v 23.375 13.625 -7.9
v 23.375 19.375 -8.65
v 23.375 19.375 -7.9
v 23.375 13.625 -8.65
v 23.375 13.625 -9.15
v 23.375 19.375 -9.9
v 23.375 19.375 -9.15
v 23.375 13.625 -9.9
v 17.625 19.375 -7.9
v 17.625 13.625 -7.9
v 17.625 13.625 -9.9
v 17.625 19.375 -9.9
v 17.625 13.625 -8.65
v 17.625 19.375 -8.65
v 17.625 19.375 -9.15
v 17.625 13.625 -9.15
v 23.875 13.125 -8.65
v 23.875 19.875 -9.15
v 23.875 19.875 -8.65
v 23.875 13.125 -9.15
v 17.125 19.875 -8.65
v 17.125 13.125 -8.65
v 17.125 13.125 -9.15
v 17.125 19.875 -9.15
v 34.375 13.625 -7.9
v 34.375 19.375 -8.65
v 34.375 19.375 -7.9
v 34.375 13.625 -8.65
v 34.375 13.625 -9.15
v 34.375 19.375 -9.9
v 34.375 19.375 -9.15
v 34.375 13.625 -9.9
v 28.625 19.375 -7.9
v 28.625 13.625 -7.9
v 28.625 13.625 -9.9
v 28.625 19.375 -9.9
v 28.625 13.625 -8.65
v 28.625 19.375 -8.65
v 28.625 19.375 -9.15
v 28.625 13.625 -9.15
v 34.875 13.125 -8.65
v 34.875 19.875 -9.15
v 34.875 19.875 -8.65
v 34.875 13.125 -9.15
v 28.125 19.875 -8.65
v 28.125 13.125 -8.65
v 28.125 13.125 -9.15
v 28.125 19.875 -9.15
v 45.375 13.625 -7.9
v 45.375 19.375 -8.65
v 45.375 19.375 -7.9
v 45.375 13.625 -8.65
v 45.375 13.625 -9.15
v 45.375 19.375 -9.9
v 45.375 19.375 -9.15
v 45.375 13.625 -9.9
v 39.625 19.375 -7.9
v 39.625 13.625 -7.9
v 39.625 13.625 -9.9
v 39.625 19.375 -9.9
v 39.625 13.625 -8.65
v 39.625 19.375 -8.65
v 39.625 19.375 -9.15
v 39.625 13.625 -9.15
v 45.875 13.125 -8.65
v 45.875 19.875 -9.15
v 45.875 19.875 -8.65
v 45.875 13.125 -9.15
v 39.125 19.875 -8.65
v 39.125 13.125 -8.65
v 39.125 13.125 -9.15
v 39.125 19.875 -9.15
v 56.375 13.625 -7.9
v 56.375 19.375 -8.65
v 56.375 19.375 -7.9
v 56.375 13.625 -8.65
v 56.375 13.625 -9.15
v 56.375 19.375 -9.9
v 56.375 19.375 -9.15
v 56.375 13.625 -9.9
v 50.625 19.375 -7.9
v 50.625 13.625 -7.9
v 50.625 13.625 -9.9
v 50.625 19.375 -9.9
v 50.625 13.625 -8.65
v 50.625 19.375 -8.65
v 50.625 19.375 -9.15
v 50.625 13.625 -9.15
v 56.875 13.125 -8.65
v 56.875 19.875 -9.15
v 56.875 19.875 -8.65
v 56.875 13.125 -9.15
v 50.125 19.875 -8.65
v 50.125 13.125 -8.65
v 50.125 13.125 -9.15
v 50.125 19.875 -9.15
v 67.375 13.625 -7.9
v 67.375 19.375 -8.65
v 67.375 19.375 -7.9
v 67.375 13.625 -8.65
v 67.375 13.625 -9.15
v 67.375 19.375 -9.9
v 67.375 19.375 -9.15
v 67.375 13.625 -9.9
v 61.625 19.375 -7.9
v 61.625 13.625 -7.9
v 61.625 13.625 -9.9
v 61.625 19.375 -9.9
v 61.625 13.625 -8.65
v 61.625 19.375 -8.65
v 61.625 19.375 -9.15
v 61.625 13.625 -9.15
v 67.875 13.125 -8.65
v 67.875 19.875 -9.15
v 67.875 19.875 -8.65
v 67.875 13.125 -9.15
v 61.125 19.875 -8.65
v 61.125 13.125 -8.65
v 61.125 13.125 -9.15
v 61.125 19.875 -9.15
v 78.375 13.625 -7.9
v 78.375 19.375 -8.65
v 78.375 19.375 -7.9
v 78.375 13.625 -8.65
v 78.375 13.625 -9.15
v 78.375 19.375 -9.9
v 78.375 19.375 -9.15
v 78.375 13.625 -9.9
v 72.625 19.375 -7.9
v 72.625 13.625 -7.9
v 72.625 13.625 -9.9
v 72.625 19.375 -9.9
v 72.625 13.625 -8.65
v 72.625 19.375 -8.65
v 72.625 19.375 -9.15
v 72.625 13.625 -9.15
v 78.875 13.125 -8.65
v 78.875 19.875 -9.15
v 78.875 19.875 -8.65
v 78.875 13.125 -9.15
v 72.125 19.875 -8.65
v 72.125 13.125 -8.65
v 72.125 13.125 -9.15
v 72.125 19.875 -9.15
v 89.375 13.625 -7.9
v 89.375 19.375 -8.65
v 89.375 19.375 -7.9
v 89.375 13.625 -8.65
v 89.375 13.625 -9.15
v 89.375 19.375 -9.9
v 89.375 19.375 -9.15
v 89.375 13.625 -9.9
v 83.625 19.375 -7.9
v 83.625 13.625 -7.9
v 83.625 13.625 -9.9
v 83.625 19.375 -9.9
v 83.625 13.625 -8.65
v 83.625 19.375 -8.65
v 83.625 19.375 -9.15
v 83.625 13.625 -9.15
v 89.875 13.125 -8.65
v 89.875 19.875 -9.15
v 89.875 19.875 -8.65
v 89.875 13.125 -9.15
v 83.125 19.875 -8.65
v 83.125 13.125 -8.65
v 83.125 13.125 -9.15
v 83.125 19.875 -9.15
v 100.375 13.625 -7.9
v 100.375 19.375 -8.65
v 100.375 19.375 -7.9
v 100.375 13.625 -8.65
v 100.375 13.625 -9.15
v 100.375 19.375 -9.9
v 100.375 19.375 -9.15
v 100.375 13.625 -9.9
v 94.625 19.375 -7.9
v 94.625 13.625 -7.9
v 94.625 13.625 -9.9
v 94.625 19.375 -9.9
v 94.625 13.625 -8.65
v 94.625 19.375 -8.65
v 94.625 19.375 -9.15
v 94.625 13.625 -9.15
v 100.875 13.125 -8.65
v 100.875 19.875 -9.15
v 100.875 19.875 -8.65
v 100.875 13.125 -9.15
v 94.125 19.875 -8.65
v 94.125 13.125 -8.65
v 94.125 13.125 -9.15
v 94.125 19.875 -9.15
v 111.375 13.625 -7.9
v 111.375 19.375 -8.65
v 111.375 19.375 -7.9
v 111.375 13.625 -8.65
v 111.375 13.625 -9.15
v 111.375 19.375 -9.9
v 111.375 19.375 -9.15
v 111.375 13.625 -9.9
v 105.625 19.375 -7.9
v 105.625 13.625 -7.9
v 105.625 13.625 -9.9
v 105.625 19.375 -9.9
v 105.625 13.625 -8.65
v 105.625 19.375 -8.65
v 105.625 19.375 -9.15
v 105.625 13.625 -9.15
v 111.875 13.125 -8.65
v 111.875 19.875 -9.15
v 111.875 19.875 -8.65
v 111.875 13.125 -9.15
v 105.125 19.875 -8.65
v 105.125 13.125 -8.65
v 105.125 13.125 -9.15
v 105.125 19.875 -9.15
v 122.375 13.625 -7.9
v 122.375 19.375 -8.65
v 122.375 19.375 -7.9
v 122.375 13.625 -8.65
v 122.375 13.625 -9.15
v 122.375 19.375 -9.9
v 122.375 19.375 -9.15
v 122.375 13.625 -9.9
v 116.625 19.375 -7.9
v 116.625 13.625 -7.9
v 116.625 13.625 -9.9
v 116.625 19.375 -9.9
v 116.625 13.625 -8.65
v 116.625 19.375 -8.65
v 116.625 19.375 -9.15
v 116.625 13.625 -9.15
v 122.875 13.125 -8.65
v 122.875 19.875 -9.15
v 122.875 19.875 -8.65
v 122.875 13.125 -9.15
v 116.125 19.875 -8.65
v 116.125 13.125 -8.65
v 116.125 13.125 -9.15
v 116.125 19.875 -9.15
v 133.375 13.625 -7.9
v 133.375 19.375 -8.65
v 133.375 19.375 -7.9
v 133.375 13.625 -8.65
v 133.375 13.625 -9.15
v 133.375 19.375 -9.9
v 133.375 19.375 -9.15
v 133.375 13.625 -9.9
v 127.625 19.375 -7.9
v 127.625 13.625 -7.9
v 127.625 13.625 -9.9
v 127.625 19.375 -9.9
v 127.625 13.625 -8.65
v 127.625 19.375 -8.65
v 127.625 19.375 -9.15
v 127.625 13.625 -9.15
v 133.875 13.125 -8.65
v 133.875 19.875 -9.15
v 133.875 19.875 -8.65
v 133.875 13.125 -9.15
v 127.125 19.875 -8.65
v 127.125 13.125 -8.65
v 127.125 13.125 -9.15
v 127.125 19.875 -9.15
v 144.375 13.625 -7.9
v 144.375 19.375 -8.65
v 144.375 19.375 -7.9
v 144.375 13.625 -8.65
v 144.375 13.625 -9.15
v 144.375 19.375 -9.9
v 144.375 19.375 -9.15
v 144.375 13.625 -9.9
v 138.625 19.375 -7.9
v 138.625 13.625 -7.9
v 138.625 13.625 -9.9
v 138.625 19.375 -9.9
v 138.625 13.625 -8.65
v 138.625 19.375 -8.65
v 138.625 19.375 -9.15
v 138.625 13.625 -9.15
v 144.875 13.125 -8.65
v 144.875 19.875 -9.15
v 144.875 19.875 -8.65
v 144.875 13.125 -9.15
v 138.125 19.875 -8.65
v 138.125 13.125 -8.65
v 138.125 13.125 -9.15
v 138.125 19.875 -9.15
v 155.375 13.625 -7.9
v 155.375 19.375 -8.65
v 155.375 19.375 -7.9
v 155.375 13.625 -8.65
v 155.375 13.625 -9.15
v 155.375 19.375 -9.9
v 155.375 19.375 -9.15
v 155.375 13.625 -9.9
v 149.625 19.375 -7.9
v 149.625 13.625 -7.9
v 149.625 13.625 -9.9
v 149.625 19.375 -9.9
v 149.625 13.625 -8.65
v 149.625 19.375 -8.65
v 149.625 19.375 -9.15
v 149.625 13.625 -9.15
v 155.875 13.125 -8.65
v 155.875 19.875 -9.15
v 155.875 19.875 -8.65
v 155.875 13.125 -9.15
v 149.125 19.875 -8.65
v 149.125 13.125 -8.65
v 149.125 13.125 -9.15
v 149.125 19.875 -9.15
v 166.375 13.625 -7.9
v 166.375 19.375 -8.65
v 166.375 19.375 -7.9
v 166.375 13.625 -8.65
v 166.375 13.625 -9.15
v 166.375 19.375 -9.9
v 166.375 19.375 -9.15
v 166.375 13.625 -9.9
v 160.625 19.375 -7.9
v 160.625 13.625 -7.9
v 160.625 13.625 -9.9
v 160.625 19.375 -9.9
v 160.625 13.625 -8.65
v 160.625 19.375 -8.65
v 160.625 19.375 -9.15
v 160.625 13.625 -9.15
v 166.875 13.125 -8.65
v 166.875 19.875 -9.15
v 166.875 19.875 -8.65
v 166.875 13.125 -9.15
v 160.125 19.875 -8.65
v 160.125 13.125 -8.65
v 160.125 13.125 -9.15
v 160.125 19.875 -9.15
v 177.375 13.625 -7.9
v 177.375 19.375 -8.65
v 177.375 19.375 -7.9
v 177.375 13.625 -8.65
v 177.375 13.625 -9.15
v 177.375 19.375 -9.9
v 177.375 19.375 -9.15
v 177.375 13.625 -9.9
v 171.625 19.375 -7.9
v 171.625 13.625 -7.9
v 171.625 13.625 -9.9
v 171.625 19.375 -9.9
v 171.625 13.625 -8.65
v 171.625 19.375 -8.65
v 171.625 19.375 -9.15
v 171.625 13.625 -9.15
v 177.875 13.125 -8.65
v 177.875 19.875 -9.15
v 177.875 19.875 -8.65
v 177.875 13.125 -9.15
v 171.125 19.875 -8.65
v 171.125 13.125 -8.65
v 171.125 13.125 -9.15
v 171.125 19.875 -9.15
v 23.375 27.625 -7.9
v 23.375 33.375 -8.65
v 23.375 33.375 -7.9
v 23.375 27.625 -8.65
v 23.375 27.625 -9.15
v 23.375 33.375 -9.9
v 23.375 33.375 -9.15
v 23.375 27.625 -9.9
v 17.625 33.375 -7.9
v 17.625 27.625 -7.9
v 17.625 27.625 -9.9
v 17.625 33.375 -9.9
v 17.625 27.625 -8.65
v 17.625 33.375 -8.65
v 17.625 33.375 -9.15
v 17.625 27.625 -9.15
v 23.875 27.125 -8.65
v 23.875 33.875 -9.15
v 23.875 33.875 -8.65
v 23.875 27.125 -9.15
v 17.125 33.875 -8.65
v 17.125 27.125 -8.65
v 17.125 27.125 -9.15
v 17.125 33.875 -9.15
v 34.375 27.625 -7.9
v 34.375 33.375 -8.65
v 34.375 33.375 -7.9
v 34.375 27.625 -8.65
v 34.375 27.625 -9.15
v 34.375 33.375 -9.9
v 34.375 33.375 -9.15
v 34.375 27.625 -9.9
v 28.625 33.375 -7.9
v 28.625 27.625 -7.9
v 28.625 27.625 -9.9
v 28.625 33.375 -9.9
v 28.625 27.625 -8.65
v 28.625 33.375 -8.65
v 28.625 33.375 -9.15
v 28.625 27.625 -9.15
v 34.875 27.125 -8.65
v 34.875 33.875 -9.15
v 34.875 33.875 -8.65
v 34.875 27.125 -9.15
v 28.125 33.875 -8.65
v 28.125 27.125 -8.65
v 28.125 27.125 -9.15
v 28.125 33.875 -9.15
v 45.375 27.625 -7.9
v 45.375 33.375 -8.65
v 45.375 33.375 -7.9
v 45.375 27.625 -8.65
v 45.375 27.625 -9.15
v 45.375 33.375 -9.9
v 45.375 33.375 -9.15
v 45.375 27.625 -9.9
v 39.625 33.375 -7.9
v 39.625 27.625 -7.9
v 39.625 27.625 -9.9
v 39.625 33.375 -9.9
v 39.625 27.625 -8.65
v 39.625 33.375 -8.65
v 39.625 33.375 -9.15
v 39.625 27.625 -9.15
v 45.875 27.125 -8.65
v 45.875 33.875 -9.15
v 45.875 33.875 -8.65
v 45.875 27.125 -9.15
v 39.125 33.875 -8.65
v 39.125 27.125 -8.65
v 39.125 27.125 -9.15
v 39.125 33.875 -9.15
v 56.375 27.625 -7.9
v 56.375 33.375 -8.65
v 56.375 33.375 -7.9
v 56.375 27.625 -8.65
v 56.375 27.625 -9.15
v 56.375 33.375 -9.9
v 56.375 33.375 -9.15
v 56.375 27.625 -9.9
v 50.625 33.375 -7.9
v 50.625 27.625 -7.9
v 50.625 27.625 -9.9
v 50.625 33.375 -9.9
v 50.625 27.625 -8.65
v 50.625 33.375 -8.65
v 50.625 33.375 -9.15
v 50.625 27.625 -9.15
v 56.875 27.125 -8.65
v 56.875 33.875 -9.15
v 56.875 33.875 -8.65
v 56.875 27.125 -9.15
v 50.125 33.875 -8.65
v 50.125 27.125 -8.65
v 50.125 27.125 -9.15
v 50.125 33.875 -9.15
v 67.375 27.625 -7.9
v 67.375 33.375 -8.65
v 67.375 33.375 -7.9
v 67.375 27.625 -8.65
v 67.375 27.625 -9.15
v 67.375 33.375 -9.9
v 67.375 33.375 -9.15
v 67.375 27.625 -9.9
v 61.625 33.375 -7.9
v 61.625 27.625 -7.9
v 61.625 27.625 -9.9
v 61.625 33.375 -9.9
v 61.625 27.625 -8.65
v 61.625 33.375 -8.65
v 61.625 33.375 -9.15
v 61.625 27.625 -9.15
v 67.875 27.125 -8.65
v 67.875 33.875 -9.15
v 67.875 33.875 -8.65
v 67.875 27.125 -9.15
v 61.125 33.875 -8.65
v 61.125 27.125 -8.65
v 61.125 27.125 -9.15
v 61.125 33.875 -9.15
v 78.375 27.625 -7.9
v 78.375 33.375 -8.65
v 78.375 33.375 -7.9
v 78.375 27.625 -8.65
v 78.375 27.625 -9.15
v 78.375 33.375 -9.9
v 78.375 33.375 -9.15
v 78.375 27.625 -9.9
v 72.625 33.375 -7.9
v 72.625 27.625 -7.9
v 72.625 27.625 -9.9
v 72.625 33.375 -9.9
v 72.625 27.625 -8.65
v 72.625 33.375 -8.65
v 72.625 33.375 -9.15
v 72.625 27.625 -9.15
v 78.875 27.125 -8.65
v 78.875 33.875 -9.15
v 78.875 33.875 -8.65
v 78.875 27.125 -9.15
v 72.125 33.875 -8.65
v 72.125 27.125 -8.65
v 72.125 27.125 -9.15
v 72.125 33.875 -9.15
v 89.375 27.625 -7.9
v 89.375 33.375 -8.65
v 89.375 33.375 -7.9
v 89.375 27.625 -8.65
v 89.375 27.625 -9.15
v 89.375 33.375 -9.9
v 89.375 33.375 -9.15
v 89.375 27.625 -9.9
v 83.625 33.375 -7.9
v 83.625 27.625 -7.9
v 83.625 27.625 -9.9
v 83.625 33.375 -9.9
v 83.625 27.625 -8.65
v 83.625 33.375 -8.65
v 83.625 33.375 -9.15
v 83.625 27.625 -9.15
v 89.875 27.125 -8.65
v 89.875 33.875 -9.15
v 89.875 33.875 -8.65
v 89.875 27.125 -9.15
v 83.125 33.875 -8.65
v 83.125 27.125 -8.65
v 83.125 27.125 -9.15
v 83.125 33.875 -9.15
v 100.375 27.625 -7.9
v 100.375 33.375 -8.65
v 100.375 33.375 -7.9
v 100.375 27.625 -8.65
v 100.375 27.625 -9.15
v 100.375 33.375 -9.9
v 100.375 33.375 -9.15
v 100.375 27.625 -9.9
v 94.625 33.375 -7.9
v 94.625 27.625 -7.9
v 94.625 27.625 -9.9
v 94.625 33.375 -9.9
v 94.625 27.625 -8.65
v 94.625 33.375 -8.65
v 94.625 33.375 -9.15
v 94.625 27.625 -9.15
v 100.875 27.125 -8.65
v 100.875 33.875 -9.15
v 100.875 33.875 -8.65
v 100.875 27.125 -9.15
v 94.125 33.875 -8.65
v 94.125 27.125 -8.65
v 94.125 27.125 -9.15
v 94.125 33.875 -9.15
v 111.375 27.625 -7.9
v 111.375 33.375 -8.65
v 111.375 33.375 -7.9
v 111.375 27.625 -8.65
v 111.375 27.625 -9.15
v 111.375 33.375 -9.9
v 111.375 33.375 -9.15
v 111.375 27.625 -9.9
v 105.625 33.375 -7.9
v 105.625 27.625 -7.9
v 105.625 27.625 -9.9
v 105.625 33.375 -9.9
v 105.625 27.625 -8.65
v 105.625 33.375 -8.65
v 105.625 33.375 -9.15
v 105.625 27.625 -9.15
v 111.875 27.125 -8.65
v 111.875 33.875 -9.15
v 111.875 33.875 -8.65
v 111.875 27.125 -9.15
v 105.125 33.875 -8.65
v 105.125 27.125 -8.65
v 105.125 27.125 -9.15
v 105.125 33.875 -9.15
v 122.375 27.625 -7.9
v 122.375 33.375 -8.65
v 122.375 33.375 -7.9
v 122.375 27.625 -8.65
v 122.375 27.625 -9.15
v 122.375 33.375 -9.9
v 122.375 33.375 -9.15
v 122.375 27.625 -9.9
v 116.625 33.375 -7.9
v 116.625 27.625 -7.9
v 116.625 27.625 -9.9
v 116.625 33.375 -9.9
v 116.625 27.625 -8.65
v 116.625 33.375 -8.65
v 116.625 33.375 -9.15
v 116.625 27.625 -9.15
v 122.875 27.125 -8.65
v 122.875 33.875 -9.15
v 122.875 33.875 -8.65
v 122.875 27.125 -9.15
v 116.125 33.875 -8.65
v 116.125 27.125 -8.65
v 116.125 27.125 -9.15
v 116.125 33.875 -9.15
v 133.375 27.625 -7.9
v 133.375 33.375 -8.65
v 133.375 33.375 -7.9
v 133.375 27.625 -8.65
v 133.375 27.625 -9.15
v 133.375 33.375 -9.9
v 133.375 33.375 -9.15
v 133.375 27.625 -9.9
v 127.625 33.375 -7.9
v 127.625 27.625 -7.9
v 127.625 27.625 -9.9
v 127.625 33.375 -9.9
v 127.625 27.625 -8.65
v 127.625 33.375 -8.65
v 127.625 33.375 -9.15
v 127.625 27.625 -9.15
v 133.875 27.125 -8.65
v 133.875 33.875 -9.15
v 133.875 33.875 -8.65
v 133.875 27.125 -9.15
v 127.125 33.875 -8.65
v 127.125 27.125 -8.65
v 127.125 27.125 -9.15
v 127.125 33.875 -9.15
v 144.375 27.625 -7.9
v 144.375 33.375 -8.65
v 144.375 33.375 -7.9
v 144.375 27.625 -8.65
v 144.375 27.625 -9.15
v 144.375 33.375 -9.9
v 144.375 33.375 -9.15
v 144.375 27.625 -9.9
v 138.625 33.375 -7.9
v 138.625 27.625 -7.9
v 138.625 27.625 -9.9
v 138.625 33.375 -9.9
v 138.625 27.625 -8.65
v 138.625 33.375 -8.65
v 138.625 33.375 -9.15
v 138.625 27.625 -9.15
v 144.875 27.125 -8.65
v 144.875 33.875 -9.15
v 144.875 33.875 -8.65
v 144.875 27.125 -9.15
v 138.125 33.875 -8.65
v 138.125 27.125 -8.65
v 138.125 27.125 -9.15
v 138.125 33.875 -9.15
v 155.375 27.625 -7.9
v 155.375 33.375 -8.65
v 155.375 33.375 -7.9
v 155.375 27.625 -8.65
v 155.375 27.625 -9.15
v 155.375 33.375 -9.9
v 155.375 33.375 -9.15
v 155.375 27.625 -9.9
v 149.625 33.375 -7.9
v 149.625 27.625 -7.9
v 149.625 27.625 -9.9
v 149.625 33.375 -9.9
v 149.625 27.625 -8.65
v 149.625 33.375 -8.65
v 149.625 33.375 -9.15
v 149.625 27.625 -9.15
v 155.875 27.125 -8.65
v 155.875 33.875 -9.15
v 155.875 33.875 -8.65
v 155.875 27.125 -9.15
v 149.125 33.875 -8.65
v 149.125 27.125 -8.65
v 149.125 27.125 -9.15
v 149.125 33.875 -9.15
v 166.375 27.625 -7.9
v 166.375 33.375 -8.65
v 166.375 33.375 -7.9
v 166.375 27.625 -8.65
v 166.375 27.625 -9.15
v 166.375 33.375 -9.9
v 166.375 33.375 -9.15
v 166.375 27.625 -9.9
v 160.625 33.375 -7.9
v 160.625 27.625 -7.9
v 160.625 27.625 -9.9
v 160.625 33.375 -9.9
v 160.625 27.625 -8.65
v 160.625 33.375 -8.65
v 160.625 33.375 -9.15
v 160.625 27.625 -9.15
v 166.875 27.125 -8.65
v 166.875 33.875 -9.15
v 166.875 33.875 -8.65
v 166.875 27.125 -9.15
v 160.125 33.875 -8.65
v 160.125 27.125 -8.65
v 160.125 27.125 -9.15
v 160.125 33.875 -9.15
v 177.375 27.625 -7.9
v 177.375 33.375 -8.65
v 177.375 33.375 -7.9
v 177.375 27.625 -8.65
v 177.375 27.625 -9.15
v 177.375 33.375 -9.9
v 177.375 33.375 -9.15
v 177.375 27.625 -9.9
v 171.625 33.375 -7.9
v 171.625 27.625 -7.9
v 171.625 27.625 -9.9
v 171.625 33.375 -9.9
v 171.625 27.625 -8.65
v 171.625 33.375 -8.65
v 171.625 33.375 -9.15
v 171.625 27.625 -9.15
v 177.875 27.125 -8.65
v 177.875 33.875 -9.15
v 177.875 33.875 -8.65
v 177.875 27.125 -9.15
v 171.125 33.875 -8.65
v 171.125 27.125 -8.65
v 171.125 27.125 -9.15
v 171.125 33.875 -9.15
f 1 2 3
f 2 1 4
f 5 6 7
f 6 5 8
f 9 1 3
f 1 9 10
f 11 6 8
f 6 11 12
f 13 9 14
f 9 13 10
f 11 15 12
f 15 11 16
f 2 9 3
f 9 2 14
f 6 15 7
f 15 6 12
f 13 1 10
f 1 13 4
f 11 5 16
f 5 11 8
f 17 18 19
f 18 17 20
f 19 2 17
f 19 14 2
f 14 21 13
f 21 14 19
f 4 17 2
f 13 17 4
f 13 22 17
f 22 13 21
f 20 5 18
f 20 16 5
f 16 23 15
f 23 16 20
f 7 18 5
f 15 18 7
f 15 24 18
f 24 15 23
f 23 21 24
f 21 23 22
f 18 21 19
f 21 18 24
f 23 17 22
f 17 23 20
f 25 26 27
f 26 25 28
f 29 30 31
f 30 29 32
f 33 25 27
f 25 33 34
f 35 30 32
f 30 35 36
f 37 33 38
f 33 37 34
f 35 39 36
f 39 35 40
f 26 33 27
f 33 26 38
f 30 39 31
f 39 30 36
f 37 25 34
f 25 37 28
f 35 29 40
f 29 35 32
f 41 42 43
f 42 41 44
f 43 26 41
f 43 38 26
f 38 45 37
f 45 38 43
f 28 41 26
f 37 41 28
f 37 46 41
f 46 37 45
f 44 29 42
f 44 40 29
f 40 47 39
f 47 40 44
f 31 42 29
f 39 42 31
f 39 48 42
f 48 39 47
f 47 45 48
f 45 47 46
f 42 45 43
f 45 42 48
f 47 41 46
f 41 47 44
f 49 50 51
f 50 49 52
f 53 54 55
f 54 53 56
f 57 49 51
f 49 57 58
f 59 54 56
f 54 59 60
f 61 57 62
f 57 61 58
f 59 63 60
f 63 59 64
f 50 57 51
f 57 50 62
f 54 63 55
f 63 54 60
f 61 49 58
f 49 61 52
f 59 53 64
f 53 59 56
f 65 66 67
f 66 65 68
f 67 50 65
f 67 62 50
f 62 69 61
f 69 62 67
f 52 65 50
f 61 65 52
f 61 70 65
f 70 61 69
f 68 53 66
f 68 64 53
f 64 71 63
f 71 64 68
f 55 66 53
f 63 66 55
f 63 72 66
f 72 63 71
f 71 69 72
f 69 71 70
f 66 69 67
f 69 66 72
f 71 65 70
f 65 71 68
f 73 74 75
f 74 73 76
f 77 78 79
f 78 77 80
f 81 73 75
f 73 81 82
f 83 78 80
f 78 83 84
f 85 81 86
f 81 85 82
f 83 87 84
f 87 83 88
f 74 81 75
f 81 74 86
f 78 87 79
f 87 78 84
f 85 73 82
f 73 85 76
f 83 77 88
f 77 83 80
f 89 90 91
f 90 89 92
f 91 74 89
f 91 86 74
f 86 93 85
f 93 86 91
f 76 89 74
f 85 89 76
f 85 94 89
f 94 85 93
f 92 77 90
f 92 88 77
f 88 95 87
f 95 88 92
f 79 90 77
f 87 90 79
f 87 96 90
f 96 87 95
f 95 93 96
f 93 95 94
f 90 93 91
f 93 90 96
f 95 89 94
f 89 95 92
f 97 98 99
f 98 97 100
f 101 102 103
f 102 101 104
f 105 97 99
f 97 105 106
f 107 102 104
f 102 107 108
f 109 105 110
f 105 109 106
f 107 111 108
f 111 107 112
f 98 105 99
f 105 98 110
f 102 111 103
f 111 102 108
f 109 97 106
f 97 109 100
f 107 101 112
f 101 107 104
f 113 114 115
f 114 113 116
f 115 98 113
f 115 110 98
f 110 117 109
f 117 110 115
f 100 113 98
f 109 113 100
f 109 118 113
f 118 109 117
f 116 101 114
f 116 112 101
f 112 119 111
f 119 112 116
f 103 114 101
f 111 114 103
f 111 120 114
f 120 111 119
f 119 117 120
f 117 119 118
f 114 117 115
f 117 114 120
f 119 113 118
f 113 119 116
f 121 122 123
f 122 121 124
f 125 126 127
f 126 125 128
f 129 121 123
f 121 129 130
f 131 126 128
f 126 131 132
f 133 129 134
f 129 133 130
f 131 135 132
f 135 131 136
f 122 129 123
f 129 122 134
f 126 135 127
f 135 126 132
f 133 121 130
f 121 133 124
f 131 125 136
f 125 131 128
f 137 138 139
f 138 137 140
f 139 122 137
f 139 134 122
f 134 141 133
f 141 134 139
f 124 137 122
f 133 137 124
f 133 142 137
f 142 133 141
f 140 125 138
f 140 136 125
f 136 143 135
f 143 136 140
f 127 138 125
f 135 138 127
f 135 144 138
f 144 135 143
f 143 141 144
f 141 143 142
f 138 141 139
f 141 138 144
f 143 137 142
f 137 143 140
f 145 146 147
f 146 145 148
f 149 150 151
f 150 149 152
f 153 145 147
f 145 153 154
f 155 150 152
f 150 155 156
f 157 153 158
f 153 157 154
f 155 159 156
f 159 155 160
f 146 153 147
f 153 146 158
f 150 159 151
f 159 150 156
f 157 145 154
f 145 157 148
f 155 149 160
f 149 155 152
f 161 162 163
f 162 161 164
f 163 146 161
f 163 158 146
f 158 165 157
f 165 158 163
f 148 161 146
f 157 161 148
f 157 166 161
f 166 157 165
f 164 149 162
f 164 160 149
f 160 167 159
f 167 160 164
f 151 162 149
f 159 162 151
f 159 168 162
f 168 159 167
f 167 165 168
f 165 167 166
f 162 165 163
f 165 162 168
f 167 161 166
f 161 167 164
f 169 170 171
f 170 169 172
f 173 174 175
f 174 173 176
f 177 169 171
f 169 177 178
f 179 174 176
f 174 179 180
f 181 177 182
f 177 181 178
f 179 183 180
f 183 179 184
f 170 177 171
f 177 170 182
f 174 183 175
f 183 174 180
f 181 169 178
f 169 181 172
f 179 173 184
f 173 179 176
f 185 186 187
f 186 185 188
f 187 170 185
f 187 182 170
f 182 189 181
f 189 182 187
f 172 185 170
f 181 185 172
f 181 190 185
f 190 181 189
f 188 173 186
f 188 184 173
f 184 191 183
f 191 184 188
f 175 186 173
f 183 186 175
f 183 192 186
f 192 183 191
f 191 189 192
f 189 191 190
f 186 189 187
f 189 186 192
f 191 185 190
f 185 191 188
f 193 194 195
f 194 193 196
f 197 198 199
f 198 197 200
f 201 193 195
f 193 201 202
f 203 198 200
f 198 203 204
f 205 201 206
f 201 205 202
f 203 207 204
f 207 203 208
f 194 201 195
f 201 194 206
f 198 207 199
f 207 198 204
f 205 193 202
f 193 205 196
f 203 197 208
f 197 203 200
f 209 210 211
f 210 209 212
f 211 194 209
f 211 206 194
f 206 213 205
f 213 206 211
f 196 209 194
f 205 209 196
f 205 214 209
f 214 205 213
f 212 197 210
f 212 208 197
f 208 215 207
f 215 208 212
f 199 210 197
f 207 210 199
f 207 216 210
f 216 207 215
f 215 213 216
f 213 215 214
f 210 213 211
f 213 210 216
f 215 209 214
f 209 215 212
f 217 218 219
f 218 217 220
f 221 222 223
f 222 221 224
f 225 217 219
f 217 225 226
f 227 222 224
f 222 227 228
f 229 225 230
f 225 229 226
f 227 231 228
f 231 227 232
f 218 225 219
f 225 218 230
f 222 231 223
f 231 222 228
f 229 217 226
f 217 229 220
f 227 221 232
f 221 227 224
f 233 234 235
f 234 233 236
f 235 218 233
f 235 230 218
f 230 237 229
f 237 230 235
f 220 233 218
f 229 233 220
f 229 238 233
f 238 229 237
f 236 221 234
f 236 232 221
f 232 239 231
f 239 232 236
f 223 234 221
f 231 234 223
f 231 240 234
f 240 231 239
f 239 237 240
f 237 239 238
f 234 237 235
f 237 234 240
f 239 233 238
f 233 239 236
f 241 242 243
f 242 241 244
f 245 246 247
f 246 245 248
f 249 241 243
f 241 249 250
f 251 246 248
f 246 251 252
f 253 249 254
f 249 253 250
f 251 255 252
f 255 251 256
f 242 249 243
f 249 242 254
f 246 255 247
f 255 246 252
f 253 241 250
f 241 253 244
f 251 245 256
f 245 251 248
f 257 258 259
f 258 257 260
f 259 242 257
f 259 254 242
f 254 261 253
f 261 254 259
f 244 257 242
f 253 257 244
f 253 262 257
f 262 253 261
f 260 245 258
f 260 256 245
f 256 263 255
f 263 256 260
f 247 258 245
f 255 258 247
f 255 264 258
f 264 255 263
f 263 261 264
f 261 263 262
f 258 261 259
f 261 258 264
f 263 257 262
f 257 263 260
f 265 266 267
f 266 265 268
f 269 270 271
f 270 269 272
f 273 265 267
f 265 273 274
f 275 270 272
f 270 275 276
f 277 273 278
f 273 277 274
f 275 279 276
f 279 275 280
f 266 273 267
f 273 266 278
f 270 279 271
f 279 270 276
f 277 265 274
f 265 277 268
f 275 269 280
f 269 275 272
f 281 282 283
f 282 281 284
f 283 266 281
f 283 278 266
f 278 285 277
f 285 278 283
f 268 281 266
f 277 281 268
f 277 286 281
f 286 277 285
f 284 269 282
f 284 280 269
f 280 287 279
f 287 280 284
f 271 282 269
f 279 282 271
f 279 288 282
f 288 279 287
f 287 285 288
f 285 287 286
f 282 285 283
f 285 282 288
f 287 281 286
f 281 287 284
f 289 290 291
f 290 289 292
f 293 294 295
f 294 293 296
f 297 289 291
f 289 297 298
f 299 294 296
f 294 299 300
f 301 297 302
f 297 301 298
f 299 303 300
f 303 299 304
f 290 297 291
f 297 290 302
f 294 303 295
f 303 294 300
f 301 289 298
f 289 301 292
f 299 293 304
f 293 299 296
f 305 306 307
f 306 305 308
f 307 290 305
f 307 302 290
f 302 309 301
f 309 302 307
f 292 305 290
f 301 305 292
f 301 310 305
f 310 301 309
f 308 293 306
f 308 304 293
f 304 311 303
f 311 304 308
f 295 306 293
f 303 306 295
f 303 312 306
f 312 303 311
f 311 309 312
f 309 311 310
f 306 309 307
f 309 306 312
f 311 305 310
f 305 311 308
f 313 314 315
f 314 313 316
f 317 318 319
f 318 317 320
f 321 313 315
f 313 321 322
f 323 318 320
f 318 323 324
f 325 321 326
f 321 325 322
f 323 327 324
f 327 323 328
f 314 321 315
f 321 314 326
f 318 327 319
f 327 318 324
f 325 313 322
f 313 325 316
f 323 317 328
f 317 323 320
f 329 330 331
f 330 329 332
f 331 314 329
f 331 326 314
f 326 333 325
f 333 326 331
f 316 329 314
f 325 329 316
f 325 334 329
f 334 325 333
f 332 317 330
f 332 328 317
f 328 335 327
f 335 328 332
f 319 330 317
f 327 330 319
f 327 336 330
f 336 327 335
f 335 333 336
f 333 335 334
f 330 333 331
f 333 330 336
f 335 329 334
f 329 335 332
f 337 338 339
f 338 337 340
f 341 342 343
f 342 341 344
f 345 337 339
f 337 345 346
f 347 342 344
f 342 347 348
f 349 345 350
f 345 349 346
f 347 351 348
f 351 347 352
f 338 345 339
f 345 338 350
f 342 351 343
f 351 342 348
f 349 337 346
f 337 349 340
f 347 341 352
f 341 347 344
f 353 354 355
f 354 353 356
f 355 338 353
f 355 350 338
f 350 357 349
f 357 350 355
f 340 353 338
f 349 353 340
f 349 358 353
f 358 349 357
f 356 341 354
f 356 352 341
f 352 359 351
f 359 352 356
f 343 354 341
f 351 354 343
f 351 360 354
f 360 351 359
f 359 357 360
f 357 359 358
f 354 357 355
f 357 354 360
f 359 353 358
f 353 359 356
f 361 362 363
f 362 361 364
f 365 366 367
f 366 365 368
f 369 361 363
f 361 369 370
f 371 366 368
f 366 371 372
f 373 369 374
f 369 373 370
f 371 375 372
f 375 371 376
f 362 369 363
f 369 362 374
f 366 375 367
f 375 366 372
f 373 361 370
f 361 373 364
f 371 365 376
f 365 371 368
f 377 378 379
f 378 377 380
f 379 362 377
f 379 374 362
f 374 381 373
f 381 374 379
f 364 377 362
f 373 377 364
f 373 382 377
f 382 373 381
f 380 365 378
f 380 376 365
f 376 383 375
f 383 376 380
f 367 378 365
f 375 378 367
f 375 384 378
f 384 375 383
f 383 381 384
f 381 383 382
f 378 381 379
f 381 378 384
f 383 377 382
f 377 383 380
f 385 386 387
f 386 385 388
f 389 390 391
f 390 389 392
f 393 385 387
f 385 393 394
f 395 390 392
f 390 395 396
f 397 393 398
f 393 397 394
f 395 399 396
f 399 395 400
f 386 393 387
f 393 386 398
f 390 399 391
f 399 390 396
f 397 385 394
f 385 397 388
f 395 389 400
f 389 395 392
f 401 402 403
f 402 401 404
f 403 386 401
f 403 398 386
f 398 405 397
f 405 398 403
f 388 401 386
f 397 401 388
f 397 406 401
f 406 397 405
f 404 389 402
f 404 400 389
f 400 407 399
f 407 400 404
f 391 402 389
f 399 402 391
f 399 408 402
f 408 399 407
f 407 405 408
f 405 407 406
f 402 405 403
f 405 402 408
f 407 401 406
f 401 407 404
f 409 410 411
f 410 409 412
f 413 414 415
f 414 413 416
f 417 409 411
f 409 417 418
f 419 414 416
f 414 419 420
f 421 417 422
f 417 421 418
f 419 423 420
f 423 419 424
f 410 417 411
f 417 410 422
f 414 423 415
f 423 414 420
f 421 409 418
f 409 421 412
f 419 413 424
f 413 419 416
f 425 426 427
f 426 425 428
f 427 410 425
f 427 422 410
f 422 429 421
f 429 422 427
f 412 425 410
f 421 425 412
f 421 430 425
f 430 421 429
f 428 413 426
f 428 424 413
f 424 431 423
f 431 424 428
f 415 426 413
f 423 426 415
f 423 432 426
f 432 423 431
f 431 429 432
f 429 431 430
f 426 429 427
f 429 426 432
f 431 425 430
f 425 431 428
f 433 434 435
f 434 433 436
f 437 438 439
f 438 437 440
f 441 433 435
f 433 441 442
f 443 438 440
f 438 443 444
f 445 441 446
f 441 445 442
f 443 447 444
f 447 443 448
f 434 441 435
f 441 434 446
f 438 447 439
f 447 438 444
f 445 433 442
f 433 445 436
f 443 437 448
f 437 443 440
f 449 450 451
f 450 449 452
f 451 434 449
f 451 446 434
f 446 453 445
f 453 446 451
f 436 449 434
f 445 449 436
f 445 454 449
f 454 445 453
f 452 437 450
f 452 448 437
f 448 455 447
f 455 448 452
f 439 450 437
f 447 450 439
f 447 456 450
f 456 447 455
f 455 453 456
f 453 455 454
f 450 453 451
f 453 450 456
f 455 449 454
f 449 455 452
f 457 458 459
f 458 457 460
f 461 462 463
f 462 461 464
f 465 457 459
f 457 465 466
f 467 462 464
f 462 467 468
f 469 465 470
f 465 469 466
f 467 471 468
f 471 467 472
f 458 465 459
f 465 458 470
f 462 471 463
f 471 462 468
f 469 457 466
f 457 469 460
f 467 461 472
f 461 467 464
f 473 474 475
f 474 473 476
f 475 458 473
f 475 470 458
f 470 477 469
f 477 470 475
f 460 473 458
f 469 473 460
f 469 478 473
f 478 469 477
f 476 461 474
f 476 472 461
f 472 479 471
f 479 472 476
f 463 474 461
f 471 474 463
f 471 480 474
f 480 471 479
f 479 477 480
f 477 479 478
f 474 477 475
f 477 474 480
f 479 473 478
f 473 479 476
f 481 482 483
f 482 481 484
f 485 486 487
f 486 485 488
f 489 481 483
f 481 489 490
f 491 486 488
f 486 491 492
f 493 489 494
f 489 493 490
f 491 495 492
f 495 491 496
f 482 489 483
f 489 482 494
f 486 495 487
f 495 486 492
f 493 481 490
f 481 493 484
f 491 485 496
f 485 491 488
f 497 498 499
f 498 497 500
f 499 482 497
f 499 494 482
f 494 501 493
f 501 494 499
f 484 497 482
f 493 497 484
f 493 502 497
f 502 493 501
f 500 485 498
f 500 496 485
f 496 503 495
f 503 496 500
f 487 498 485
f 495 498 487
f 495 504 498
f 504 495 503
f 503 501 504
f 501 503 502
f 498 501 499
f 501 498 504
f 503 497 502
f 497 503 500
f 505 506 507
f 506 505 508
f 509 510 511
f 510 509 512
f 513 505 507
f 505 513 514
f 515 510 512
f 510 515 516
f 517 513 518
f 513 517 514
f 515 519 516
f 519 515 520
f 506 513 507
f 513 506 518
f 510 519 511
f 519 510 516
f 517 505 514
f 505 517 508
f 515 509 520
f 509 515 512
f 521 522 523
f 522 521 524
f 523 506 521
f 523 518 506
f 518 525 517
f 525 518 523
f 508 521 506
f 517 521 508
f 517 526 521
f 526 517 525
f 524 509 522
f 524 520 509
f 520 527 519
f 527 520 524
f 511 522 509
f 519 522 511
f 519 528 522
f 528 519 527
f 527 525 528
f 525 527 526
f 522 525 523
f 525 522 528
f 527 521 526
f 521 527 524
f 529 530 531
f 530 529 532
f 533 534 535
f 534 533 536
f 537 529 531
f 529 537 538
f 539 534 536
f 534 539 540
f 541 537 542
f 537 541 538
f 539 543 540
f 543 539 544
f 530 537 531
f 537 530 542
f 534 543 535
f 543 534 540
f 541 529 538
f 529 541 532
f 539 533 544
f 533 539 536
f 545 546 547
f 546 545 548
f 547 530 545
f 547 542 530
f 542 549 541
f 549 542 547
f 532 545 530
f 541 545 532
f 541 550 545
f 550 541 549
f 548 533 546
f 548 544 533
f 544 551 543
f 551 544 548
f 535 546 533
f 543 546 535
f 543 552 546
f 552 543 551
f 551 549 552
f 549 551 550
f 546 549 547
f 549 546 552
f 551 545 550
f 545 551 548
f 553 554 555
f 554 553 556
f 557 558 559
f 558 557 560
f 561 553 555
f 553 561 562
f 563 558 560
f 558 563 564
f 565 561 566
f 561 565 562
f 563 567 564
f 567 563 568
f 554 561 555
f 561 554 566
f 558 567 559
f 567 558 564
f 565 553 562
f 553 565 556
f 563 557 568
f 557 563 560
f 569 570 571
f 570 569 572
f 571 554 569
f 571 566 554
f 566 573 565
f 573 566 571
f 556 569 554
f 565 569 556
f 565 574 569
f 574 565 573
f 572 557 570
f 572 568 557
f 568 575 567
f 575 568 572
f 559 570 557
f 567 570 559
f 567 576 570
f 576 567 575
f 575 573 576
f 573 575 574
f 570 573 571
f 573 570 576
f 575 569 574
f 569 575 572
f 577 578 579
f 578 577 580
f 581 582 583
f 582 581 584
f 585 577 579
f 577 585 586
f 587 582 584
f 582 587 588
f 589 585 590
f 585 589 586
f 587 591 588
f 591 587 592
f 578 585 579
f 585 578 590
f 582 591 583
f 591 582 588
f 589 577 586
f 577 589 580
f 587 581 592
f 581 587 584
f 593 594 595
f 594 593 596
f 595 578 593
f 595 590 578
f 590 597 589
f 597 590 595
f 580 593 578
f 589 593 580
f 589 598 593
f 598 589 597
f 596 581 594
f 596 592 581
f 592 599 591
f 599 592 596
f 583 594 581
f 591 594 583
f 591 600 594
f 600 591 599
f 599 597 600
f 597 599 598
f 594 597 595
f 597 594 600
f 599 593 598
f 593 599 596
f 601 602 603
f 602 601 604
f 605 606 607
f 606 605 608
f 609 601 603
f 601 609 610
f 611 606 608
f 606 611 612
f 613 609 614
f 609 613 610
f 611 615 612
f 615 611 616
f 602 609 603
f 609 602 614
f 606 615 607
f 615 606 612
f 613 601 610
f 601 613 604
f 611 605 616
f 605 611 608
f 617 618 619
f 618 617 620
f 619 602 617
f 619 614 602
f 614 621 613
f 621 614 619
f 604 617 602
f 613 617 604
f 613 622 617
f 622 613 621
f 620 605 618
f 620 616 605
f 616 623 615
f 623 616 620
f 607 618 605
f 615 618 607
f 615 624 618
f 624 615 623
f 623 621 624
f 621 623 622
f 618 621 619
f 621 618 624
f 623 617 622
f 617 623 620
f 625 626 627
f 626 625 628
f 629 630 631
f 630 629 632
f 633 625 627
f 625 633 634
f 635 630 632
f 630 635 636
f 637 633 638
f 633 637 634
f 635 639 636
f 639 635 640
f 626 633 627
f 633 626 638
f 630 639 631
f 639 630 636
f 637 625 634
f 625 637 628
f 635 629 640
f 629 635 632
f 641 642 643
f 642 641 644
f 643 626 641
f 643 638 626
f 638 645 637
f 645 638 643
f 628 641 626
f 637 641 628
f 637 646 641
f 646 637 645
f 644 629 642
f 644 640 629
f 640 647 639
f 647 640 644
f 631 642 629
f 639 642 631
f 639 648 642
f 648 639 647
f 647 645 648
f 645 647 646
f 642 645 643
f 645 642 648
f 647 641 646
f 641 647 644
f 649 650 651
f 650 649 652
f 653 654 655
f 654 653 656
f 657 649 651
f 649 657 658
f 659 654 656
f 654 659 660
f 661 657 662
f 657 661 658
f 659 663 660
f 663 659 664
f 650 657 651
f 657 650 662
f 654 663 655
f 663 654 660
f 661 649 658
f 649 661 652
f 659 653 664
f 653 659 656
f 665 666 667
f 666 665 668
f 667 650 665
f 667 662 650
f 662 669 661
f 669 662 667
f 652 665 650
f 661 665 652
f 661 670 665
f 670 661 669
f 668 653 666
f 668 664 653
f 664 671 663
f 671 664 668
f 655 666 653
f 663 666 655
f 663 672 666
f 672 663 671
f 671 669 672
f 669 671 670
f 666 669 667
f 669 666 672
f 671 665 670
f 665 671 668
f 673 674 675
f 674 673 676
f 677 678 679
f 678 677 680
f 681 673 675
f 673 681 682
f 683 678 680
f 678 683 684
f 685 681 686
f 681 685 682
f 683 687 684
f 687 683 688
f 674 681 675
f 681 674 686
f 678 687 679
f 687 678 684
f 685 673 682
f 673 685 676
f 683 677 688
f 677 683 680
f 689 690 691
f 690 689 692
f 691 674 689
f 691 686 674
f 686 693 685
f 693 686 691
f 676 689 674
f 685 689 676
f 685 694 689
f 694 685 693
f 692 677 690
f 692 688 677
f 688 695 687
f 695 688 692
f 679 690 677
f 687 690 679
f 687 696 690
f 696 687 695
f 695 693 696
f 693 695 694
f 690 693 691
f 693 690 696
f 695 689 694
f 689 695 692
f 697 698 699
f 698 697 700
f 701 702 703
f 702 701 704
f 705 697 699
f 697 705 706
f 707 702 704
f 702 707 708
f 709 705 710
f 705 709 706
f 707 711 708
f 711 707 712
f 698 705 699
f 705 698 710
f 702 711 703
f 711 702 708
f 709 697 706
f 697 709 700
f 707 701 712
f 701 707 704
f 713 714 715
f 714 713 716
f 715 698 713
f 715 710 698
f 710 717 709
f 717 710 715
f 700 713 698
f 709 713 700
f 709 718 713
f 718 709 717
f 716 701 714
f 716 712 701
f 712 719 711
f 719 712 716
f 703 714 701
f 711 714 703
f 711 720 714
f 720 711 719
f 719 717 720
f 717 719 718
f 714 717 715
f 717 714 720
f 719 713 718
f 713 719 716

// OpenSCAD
// file: Defines_v1.scad
/* spacing between the leds
 * usually around 12, can be forced
 * to 6-10 by bending strip
 */
space = 6;  

/* some space for the outermost leds
 * for better viewing angle
 */
margin = 10;

/* 15 leds (type 5050) with above spacing */
width = 15 * (5 + space) + 10 + 2 * margin;

/* box height, min. 42mm */
height = 47;

/* box depth, min 100mm for 4x3-keypad */
depth = 105;

/* max wall thickness */
thick=10;

/* grade of feet smoothness
 * below 10 looks bad
 * 10-16 is reasonable
 * above 16 takes much time to render
 */
grade = 12;

/* length of side stands 
 * should be enough to get box in right angle
 * should not exceed back of box
 */
stand = min(height + 20, depth - 40);

/* offset of usb plug from center */
usb_offs = 60;

/* calculated values */
bwidth = width + 14;
bheight = depth + 7;

/* size of led holes 
 * includes some margin for 5050 leds
 */
led = 5.75;

minimal = 1;
// main file
include <Defines_v1.scad>;

module LED() {
    union() {
        cube([led, led, 2], center = true);
        cube([led+1, led+1, 0.5], center = true);
    }
}

module Diffusor() {
    translate([margin, 0, -thick + 1.1]) {        
            for (a = [ 0 : 1 : 14 ])
                translate([(a + 0.5) * (5 + space) + 5, height / 2 - 7, 0]) 
                    LED();
                    
            for (a = [ 0 : 1 : 14 ])
                translate([(a + 0.5) * (5 + space) + 5, height / 2 + 7, 0]) 
                    LED();
        }        
}

Diffusor();
